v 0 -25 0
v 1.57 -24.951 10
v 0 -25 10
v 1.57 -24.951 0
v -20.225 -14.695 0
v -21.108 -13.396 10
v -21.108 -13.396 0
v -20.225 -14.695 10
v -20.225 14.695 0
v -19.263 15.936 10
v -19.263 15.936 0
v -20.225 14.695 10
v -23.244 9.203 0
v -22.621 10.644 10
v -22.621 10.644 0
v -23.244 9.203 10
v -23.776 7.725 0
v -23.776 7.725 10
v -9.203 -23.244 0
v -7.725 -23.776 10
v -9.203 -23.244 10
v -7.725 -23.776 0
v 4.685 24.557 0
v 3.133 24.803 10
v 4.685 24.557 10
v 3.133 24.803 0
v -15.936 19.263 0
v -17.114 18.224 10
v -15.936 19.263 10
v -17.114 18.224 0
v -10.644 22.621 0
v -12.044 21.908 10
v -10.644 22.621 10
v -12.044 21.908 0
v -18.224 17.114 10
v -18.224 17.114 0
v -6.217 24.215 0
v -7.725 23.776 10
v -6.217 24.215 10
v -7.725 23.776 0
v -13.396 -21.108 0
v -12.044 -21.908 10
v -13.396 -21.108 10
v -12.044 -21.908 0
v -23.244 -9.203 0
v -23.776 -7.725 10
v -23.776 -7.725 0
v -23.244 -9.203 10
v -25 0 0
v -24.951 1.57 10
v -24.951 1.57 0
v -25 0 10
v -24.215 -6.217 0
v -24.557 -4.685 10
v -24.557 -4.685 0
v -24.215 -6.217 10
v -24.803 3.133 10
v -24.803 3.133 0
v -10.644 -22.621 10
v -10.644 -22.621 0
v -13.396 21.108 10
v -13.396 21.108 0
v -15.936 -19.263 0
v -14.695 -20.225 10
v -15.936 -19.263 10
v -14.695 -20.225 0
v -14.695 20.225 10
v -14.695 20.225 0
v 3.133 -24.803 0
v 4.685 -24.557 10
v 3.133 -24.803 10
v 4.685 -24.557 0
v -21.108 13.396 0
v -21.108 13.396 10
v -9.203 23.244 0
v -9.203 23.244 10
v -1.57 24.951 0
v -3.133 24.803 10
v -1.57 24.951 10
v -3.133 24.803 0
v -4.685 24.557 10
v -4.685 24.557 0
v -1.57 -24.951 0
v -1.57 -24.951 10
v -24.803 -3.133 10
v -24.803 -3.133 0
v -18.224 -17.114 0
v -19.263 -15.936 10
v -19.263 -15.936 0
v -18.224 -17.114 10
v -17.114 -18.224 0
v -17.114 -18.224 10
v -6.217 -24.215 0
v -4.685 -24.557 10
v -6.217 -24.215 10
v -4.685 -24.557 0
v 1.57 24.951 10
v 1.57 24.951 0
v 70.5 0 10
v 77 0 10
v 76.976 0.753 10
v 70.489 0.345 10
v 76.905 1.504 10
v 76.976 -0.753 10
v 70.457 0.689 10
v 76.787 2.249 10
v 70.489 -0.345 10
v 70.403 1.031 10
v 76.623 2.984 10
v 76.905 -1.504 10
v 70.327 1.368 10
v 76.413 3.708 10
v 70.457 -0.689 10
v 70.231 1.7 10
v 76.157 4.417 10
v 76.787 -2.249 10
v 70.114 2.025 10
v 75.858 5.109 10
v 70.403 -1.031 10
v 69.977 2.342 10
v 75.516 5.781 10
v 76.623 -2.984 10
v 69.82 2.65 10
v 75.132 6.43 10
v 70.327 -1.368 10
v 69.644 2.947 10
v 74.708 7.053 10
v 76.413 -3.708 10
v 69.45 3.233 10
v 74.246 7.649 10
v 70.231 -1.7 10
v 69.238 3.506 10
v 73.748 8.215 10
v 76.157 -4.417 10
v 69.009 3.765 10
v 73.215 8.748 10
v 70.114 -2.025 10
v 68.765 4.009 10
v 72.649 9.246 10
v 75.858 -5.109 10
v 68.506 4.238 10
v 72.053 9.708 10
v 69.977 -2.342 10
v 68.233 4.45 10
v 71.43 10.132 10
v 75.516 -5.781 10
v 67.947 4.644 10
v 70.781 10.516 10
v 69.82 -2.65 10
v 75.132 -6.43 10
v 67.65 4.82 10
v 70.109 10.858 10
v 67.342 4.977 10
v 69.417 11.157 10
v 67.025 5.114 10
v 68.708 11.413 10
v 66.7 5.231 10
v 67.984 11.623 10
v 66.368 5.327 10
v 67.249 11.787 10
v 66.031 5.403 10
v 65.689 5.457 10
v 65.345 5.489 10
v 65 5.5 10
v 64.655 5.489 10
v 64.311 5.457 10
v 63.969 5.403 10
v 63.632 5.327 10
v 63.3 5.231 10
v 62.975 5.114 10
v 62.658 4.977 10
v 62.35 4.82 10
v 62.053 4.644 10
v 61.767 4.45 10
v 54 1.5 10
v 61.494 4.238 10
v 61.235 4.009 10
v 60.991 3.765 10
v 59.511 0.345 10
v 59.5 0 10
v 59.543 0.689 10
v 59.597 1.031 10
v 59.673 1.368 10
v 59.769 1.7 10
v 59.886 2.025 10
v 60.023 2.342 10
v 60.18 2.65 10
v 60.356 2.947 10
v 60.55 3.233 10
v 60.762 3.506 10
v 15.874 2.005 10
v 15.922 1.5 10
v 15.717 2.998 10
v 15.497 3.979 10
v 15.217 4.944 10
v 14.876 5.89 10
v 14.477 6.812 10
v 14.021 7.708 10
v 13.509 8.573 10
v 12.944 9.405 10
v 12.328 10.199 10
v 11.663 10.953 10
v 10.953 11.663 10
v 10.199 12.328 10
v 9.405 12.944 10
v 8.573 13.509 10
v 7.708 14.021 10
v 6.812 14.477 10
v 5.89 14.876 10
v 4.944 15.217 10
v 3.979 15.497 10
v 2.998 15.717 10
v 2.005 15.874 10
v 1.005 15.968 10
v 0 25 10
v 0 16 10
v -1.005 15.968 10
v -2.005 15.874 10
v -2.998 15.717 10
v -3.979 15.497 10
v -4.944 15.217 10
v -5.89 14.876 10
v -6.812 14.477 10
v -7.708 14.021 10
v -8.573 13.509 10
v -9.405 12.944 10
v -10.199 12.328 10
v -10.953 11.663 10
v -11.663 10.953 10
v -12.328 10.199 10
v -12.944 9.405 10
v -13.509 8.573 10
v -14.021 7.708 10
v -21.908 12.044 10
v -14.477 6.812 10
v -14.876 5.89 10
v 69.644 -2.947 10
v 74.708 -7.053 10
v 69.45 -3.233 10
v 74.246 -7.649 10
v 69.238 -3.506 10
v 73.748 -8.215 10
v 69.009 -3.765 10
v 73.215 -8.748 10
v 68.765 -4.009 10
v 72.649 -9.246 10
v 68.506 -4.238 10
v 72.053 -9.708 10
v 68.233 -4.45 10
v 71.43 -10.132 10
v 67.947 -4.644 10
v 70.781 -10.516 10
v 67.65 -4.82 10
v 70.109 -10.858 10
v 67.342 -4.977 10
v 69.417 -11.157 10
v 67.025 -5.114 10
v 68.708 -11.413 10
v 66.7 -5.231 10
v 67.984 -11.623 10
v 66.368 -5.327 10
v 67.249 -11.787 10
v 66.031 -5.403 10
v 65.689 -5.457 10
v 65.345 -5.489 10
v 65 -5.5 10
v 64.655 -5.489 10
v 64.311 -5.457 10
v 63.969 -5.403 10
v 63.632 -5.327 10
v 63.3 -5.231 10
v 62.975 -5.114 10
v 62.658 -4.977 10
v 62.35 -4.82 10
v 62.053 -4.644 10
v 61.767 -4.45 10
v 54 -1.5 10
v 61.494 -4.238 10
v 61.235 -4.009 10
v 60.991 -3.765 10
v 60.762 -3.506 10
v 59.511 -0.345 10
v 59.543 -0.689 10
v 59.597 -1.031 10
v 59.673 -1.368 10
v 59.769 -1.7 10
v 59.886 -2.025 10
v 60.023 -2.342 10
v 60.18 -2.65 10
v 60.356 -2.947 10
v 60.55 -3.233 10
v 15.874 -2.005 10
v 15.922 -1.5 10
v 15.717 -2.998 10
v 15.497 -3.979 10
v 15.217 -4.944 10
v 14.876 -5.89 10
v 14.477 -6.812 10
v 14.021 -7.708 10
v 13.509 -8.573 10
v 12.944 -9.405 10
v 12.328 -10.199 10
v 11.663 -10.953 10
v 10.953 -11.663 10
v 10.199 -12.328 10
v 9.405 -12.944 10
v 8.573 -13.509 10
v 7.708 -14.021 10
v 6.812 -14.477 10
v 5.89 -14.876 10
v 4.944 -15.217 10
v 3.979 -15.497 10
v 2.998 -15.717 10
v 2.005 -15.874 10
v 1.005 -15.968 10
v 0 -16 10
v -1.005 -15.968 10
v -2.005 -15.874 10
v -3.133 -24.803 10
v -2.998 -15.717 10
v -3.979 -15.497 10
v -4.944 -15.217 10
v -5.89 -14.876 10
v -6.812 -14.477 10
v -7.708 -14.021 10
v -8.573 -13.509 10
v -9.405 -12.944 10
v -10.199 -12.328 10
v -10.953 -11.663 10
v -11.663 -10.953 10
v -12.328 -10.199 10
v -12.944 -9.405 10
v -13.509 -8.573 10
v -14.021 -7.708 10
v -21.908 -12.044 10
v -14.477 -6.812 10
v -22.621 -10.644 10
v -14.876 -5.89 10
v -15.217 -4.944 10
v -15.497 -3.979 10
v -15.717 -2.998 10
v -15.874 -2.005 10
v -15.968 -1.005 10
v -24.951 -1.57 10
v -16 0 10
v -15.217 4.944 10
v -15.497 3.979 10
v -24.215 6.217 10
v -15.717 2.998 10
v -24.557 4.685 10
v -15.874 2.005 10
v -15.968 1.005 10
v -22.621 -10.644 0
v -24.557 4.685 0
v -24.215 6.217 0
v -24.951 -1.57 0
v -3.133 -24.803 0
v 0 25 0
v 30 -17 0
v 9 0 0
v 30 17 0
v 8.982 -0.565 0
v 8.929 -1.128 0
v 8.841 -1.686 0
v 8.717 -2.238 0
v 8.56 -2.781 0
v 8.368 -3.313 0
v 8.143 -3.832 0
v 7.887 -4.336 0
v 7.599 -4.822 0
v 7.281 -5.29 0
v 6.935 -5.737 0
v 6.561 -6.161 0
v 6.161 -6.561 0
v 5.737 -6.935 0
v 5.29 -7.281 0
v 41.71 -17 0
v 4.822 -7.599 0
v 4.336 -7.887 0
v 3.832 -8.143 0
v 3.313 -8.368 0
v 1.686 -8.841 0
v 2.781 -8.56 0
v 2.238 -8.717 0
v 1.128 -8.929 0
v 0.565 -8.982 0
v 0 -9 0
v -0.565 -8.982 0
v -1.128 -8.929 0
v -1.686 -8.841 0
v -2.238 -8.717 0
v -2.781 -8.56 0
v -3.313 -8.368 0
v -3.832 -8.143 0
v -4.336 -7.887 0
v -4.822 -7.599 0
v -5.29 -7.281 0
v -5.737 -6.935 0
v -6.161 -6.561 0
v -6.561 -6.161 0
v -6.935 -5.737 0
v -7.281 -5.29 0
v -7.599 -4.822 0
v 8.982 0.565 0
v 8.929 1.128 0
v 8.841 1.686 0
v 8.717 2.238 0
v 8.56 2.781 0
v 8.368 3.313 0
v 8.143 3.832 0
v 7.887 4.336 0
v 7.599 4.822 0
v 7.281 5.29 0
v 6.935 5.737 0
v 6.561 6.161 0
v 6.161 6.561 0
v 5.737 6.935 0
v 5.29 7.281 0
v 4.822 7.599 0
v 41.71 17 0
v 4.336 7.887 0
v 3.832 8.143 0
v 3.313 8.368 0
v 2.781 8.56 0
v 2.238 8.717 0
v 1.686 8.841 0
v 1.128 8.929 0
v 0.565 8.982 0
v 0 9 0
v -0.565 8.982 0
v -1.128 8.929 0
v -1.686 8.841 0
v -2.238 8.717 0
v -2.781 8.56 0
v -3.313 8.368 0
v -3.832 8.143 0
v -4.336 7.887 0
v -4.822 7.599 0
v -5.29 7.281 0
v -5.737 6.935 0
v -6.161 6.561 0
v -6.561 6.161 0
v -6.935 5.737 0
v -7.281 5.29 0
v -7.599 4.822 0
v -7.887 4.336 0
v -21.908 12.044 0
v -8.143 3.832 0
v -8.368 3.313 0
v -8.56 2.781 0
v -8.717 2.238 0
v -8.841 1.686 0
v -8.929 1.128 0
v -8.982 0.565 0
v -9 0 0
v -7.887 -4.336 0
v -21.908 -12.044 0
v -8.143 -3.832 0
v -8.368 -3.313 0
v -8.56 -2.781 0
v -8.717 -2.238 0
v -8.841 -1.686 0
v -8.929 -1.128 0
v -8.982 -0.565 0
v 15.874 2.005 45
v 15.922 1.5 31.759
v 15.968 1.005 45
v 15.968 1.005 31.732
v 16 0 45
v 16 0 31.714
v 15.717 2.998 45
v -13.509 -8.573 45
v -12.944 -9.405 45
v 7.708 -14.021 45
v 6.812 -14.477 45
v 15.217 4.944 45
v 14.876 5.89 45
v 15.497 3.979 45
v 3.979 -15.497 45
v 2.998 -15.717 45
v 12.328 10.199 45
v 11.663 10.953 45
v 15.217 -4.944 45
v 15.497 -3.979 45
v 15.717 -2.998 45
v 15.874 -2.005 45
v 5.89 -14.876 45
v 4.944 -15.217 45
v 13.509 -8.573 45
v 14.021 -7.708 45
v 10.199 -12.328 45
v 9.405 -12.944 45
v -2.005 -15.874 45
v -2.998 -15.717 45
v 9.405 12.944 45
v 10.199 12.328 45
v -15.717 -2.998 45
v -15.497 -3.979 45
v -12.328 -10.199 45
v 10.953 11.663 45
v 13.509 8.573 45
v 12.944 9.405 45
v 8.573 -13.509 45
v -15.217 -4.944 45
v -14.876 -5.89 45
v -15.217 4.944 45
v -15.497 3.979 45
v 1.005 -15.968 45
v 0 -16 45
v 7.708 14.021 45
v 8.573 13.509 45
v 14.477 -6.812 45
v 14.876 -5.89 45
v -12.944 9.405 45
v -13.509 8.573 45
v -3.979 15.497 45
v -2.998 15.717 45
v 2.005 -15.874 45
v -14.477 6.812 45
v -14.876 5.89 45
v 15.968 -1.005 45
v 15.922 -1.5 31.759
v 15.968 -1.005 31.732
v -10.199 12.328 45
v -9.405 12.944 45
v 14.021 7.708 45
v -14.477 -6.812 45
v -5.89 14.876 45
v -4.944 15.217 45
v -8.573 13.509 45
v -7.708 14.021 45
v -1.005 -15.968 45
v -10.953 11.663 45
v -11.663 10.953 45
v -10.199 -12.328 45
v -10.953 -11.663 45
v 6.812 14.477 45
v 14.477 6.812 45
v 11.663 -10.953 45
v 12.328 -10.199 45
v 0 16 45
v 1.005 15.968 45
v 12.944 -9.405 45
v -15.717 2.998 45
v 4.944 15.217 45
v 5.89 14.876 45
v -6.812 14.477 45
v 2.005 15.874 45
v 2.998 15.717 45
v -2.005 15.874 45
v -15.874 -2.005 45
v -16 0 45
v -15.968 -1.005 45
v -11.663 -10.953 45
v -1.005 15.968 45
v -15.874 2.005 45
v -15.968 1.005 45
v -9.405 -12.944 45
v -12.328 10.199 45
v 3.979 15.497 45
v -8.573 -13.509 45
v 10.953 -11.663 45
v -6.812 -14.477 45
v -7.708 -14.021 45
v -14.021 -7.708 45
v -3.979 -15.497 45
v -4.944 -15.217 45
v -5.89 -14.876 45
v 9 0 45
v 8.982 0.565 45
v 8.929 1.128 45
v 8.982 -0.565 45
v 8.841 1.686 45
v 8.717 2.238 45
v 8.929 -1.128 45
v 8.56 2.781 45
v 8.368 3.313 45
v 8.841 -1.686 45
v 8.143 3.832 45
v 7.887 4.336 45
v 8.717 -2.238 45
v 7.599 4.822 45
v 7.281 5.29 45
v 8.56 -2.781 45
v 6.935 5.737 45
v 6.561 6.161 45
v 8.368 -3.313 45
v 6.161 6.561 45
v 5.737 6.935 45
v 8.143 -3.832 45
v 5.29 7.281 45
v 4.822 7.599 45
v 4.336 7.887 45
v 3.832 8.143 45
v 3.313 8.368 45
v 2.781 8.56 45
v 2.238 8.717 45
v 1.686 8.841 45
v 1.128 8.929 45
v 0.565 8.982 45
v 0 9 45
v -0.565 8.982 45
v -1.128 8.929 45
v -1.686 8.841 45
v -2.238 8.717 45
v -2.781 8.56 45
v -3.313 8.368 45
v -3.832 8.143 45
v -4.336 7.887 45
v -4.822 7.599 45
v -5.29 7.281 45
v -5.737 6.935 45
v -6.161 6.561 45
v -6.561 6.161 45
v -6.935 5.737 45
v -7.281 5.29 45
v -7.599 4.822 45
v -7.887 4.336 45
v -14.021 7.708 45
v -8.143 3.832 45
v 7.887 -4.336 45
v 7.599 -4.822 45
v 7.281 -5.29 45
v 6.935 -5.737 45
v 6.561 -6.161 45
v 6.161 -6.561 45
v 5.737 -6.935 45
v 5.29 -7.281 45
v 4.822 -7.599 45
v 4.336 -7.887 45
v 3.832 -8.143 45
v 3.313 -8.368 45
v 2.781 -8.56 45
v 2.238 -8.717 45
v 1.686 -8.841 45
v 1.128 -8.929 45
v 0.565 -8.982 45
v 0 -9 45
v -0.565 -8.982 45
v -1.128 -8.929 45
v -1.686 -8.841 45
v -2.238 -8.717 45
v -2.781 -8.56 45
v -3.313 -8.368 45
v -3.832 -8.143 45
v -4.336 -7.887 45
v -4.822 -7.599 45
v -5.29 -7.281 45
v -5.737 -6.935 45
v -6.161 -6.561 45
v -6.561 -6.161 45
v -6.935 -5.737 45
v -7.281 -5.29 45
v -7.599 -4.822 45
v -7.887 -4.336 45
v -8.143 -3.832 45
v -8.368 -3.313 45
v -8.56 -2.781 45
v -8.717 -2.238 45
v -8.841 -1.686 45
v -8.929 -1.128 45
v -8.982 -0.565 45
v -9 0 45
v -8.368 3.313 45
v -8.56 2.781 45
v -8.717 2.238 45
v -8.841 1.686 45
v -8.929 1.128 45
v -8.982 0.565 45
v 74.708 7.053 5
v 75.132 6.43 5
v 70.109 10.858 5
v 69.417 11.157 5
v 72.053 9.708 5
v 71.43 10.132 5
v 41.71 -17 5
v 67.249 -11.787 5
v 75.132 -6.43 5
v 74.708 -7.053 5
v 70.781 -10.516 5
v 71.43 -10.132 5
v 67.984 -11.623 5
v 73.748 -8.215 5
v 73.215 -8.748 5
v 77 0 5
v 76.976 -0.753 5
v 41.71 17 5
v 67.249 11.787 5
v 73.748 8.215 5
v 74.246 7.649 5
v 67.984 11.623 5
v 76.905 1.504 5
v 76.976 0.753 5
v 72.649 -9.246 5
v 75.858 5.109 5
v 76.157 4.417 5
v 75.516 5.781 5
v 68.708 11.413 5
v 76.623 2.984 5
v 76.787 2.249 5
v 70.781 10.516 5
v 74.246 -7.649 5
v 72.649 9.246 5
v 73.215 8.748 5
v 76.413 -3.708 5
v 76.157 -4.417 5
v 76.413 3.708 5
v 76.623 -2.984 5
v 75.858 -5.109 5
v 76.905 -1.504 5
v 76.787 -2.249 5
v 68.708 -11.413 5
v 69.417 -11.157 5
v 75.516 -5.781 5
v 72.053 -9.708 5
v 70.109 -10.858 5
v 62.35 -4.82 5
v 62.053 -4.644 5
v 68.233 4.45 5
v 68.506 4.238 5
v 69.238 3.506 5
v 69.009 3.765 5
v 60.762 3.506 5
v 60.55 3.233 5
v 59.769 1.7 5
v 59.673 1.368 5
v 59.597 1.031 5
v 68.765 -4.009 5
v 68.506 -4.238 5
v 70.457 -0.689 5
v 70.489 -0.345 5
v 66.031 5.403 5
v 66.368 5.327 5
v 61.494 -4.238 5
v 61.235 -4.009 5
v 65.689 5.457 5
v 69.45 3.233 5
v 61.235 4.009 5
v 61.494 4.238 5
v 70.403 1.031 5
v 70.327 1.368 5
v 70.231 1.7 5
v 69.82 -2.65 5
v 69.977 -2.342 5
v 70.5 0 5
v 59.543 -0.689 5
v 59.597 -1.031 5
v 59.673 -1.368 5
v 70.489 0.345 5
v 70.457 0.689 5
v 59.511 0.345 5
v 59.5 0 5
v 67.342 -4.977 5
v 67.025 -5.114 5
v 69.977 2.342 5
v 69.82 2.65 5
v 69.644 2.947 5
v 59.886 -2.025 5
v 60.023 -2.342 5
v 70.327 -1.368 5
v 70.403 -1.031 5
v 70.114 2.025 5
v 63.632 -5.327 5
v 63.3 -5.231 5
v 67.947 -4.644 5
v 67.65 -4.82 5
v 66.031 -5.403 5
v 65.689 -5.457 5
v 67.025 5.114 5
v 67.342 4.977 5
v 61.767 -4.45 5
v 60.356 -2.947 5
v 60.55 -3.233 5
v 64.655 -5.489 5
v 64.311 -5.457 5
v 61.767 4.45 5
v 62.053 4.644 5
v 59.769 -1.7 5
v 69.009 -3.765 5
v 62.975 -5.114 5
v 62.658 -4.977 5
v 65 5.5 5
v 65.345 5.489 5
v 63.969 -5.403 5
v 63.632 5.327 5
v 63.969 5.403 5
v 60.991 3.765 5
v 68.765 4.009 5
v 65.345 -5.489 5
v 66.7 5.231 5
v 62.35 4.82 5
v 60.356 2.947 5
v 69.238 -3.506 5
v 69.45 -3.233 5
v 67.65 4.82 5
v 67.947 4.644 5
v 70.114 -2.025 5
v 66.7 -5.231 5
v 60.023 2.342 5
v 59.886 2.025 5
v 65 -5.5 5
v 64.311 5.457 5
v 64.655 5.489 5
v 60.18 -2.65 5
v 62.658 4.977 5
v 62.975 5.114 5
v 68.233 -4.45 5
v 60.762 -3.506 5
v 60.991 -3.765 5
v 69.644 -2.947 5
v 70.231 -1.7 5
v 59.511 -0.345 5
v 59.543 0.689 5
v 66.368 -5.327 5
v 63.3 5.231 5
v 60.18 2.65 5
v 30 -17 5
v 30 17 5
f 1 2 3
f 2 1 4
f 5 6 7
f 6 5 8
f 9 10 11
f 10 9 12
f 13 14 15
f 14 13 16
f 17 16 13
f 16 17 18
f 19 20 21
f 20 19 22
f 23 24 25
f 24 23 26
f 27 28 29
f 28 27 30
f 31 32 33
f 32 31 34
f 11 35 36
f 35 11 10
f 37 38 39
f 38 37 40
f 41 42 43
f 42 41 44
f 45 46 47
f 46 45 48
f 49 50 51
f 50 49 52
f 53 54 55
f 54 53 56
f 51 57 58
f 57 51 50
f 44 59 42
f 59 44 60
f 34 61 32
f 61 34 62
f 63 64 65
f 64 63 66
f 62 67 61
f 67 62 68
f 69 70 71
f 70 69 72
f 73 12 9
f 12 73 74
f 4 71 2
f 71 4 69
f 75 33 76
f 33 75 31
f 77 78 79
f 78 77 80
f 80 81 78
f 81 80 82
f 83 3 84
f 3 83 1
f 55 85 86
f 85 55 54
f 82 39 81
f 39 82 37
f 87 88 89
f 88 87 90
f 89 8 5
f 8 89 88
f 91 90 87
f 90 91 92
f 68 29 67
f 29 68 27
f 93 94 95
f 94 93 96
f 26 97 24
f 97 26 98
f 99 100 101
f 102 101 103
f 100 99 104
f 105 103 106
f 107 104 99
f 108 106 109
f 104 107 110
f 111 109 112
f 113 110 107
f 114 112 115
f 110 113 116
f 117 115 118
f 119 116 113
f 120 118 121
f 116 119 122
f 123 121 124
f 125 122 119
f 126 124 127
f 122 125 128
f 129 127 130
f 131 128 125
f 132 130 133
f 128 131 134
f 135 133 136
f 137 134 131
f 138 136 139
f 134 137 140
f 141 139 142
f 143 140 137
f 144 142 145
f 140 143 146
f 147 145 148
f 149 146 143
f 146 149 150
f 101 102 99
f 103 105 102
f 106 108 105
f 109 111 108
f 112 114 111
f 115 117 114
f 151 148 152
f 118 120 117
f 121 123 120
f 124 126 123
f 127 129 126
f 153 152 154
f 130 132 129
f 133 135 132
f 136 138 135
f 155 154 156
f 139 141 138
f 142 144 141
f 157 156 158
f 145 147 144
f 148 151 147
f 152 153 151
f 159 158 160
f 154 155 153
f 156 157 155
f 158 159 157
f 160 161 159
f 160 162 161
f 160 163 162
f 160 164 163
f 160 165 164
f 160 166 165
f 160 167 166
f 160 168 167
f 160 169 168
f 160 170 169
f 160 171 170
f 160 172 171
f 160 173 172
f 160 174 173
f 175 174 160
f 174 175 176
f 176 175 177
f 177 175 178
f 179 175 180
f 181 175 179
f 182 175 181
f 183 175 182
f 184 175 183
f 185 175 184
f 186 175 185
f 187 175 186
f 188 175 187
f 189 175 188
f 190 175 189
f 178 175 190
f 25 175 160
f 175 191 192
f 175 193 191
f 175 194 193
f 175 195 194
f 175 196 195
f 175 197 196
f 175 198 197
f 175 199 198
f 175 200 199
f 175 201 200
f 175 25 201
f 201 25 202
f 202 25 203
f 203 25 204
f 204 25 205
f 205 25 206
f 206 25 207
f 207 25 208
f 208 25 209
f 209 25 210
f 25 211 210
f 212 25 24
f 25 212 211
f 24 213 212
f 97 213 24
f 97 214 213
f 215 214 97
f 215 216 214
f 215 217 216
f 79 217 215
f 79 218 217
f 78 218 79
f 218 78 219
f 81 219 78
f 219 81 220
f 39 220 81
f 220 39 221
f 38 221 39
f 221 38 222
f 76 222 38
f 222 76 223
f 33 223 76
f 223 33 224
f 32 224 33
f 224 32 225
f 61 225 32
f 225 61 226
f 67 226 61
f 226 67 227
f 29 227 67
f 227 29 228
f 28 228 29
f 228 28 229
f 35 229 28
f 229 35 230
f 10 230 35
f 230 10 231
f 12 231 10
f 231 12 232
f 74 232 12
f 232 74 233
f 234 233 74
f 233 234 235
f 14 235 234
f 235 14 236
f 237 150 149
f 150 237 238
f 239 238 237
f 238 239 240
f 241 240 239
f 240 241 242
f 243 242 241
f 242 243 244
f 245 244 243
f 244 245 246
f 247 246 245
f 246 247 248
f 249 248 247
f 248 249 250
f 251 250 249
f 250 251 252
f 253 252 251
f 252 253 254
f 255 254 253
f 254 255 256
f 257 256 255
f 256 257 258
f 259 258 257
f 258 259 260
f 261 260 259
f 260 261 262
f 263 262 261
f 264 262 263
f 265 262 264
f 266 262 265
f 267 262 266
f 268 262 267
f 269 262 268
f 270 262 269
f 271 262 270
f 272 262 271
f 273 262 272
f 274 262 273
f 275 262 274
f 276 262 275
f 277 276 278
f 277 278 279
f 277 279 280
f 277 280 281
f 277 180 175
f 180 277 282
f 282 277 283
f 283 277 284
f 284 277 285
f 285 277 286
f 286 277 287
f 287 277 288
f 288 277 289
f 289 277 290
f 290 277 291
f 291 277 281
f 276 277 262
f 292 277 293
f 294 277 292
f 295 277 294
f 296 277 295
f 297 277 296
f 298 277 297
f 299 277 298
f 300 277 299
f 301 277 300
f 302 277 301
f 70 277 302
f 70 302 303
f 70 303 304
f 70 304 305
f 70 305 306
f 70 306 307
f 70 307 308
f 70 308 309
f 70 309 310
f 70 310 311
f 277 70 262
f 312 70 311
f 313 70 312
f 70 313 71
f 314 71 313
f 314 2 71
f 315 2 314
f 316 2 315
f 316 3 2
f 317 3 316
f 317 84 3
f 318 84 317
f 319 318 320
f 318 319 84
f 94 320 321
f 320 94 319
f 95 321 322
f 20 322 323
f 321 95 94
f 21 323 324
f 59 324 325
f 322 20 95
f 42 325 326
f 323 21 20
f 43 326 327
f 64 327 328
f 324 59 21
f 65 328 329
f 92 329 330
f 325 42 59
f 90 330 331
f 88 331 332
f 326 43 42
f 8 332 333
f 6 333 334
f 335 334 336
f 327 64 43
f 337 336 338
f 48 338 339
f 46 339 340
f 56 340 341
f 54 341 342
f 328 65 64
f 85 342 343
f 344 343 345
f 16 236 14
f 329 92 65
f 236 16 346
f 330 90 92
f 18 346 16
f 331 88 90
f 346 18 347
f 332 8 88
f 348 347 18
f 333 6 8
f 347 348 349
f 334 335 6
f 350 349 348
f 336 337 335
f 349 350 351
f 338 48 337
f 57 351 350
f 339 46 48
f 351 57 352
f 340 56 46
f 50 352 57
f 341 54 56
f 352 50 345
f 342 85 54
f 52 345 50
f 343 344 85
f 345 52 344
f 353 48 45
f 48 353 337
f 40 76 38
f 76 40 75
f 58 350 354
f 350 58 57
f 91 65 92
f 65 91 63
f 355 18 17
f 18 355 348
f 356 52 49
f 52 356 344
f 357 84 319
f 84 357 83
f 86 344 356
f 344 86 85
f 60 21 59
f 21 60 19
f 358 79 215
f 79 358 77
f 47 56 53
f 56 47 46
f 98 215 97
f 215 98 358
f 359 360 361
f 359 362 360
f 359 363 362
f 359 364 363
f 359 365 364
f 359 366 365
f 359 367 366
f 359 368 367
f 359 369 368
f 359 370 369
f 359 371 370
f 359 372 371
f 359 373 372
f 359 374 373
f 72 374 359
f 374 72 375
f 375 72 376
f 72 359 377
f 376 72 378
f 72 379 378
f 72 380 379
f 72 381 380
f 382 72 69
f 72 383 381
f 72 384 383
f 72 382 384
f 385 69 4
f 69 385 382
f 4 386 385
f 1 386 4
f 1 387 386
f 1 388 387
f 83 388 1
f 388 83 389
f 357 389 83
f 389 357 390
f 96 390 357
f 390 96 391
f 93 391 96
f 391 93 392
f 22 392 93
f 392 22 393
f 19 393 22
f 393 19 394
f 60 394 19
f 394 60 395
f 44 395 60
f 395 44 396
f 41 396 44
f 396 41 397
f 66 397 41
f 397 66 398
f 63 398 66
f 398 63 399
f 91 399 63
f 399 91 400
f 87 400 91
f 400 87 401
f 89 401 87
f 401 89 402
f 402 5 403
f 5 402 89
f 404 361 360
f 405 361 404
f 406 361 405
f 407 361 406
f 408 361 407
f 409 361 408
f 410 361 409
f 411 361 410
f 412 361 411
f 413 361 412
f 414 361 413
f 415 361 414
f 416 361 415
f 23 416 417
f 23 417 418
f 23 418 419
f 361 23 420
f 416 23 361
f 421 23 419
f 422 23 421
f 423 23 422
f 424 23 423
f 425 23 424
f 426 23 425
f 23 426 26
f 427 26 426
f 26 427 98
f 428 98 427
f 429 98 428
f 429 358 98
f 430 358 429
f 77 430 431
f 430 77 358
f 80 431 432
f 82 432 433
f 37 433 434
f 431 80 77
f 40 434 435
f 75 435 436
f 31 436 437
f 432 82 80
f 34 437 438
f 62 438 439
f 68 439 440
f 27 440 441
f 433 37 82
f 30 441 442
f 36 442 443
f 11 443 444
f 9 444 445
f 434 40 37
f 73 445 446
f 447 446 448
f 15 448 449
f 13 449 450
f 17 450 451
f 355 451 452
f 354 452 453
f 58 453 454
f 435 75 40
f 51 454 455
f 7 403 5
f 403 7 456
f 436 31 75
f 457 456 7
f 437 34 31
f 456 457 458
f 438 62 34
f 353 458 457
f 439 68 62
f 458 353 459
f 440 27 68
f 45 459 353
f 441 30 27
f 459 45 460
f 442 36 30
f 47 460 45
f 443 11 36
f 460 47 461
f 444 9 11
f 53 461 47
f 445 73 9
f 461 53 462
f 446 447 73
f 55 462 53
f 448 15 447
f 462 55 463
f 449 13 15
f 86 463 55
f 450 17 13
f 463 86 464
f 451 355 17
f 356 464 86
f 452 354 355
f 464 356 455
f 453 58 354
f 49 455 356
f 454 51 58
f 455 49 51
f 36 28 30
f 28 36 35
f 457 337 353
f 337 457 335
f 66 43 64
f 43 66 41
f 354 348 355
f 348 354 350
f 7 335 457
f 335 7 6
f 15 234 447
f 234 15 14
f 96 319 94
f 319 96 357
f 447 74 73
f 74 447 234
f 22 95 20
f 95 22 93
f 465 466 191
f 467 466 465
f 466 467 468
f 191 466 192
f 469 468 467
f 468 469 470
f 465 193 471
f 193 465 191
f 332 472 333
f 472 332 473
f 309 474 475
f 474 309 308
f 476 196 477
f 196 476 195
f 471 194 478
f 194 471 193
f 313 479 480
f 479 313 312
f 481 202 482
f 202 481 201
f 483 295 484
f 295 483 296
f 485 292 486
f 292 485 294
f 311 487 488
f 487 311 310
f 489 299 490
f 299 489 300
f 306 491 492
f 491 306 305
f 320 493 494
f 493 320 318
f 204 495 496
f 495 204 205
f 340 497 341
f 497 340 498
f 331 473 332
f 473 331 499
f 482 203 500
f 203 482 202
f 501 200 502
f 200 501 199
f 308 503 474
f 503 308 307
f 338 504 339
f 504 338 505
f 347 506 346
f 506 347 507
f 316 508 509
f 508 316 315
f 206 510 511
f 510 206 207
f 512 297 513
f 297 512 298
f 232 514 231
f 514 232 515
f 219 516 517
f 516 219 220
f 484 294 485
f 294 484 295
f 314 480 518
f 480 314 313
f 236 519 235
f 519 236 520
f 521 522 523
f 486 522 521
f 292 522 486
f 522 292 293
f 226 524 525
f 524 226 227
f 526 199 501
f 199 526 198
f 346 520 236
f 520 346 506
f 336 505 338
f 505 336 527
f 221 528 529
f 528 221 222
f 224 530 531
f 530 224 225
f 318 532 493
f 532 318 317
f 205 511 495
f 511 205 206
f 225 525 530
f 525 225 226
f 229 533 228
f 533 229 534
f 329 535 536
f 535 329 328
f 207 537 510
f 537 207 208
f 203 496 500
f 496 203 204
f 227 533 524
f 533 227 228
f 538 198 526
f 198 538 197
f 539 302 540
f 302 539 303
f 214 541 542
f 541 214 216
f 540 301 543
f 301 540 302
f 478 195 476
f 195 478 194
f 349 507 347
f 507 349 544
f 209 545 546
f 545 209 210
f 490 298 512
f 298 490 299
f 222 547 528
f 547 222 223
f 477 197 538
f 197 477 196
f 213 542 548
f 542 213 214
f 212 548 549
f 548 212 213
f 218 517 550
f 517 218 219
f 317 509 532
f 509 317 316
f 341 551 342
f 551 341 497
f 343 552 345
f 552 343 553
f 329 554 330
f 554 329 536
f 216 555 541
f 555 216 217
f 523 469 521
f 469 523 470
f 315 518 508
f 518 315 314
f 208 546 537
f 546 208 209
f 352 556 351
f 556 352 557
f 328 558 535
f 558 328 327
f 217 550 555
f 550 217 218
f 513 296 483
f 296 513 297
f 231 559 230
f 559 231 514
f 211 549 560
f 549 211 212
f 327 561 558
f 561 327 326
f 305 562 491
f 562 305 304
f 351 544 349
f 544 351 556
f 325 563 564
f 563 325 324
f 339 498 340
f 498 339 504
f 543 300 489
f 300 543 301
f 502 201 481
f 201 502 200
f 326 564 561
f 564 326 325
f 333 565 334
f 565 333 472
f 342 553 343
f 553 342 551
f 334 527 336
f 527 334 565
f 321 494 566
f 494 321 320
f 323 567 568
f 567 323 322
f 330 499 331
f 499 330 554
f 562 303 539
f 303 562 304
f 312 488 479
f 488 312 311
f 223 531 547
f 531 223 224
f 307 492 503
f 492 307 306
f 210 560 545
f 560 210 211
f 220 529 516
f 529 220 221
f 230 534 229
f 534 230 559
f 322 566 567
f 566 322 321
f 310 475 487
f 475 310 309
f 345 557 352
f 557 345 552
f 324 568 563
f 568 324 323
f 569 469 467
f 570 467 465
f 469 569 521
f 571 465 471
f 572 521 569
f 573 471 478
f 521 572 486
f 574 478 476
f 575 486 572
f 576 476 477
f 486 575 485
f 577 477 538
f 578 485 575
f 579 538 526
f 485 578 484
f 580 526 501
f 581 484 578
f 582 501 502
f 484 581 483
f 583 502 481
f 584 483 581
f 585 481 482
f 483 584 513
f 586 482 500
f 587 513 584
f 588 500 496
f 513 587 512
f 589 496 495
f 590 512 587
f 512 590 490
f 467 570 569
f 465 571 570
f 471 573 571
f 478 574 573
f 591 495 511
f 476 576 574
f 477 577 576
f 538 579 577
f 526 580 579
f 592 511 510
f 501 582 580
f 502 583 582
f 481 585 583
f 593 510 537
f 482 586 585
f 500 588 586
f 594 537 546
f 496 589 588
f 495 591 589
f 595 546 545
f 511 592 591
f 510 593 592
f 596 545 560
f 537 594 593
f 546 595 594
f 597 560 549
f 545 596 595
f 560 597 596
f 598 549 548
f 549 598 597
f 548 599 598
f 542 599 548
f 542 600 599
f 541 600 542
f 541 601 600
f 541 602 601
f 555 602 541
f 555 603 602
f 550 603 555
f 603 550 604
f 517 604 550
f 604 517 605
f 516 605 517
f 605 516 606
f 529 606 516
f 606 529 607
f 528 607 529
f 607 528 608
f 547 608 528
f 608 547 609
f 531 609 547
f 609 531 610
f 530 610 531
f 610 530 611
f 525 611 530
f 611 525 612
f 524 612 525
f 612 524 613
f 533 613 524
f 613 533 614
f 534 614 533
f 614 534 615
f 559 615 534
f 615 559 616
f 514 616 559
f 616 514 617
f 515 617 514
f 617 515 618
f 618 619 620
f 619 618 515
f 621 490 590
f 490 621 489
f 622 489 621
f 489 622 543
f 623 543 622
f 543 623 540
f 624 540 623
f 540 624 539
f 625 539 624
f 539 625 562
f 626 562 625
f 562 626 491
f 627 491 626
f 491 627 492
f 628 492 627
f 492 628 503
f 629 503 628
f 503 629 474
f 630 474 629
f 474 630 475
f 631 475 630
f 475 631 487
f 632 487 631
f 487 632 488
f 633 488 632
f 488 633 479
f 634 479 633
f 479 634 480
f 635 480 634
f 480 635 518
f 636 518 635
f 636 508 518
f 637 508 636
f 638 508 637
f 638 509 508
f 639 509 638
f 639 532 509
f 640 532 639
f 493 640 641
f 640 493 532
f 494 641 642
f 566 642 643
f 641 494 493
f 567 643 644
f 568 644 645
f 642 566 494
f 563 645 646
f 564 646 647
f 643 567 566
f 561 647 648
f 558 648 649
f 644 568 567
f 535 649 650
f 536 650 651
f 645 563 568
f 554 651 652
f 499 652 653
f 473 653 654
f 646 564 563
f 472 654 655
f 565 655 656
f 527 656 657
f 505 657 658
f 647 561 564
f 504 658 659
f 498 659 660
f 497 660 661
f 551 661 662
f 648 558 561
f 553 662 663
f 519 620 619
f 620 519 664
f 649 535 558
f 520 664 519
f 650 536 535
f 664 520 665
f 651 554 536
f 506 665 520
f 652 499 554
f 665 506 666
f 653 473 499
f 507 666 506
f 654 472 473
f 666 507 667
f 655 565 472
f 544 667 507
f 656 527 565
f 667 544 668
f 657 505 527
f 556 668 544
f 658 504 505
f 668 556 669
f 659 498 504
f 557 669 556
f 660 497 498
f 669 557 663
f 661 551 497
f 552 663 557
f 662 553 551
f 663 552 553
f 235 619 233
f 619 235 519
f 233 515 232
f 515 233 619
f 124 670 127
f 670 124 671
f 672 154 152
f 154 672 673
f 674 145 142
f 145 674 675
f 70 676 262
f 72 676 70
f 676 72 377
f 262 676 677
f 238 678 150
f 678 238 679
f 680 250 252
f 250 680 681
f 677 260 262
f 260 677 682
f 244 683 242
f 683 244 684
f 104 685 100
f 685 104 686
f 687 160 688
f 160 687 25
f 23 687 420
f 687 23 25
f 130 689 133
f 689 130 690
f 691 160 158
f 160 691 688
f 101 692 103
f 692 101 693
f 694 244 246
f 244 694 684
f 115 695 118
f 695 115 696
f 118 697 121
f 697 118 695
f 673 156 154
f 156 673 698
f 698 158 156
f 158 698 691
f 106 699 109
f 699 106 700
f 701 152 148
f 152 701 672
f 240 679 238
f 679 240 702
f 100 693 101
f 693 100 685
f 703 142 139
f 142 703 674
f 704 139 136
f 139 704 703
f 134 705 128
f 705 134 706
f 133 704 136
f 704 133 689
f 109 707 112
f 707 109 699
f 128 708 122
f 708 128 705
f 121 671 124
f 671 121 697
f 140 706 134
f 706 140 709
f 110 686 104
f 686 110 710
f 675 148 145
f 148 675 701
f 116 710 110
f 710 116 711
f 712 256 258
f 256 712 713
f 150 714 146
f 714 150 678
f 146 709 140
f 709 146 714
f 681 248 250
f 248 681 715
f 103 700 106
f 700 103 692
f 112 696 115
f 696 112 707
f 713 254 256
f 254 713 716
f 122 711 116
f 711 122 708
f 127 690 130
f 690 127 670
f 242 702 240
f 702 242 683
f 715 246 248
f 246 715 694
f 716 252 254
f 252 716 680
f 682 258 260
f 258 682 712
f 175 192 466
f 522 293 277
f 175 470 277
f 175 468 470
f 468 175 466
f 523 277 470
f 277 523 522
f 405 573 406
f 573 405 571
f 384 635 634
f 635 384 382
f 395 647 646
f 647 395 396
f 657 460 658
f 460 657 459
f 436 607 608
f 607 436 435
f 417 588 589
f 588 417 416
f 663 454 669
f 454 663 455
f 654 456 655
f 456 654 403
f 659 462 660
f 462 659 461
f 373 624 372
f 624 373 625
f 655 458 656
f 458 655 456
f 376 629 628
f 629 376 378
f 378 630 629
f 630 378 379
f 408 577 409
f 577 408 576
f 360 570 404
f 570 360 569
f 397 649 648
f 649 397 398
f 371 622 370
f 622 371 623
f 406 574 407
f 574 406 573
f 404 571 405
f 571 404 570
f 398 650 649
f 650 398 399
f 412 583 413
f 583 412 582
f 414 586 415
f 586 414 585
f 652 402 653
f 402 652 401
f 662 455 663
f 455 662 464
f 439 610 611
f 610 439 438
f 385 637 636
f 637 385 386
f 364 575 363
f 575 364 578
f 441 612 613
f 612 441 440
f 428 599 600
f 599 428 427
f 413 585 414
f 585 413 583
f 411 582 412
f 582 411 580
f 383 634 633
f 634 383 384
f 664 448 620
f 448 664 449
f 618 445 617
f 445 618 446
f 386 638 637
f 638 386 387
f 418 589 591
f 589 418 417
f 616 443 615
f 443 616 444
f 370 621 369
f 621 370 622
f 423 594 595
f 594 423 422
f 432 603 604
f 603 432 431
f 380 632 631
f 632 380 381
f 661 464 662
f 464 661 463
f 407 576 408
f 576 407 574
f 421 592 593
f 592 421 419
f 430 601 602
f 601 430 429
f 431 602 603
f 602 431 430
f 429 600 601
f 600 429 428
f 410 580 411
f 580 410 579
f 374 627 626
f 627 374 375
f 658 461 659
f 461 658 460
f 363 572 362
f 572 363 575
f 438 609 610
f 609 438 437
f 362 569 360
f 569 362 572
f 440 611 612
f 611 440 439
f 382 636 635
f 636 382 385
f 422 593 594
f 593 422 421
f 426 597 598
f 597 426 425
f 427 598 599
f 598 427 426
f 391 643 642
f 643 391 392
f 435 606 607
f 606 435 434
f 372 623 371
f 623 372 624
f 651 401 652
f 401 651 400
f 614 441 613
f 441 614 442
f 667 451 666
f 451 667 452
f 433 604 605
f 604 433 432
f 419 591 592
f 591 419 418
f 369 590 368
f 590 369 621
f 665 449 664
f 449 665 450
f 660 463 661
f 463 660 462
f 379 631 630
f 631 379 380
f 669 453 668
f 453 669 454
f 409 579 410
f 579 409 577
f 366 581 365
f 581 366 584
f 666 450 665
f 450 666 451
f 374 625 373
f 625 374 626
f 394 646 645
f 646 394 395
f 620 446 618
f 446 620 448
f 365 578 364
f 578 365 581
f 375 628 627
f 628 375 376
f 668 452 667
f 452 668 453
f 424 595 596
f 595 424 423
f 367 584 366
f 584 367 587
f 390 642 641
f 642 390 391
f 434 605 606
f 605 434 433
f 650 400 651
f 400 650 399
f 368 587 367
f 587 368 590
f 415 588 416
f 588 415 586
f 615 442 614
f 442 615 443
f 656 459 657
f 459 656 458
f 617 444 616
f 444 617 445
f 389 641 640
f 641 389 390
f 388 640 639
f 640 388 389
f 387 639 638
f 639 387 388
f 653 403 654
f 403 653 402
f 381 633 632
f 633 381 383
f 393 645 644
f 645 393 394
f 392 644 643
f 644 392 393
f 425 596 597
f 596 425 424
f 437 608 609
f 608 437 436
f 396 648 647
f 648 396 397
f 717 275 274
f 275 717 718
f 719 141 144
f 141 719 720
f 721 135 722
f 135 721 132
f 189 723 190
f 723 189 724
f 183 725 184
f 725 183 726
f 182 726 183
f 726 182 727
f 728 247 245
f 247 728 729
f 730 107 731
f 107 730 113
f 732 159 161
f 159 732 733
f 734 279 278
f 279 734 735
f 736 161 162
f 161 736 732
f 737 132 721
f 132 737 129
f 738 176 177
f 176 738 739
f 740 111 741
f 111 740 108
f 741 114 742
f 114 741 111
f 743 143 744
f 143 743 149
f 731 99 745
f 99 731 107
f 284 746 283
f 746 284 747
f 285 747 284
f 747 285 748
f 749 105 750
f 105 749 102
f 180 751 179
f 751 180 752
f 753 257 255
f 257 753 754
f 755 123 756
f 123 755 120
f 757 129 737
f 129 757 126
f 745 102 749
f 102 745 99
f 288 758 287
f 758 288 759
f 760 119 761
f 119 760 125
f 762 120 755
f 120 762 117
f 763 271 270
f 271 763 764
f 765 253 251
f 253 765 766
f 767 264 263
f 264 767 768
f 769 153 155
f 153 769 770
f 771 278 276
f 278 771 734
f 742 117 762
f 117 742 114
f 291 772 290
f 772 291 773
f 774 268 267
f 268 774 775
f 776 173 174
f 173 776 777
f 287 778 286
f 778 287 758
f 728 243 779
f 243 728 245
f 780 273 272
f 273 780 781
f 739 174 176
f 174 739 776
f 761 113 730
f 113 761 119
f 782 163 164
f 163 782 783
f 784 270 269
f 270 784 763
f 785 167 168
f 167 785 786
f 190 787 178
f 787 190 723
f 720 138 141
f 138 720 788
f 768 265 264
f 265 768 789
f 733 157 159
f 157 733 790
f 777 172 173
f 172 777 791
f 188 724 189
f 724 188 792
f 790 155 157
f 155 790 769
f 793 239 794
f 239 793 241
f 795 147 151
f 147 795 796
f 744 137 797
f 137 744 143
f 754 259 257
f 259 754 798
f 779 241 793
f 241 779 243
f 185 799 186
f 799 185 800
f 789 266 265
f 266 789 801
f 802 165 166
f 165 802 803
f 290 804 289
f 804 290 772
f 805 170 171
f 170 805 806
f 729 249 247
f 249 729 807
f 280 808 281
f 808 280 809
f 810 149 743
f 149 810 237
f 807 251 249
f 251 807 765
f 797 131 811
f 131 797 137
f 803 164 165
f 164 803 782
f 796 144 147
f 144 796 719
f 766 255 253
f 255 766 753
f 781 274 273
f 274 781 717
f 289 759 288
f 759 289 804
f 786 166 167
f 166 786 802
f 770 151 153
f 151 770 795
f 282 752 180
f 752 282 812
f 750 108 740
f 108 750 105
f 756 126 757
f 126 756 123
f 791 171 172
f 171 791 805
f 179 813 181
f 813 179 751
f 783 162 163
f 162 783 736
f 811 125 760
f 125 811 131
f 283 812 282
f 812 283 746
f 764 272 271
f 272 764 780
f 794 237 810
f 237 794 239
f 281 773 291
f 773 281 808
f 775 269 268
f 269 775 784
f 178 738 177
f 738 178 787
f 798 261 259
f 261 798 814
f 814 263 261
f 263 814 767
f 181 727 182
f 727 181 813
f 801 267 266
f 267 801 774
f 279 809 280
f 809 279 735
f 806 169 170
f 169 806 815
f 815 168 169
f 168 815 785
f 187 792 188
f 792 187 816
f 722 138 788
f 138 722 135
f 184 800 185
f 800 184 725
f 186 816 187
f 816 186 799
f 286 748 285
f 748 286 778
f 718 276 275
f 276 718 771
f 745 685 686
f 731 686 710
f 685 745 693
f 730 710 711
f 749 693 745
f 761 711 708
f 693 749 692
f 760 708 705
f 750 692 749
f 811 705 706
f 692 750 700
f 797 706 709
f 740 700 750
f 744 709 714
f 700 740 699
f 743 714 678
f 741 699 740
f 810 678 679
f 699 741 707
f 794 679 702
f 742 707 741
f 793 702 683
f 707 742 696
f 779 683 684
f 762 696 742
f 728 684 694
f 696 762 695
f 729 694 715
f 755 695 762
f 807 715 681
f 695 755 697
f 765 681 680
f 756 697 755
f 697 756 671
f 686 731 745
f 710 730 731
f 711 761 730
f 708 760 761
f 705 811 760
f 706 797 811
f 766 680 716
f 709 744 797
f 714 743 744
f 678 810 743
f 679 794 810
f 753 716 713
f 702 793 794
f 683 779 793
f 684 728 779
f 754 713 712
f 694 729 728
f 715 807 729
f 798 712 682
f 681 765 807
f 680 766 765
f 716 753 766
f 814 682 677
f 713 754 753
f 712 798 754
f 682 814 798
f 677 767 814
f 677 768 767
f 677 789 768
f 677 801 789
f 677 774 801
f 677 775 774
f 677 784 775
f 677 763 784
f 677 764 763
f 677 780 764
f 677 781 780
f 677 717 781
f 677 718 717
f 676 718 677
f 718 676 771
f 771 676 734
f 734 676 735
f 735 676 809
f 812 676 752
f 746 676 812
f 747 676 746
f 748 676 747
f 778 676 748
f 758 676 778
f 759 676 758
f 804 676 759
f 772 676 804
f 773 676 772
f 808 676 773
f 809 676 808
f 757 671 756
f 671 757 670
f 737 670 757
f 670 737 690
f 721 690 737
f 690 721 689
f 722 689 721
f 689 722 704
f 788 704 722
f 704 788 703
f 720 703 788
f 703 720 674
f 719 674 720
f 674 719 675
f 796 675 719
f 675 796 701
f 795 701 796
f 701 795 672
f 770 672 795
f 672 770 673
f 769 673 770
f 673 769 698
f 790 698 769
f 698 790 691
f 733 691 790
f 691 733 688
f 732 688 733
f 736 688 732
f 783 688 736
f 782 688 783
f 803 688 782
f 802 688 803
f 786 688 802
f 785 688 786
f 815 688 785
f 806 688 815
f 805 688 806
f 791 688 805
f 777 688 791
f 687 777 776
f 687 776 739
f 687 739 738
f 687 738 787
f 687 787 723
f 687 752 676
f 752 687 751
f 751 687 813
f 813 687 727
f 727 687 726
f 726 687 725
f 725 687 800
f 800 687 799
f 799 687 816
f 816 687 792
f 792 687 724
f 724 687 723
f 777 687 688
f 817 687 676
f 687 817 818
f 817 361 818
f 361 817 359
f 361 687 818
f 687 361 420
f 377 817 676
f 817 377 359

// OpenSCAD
// ==========================================
// Parametric Variables
// ==========================================
$fn = 100; // High resolution for smooth curved surfaces

// Base and Sleeve Dimensions
base_radius = 25;
base_height = 10;
sleeve_outer_radius = 16;
sleeve_inner_radius = 9;
sleeve_height = 45;

// Projecting Arm Dimensions
arm_length = 65; // Distance from center to end of the arm
arm_end_radius = 12;
arm_height = 10; // Flush with the base section
arm_hole_radius = 5.5;

// Underside Cutaway Dimensions
cutaway_length = 35; // Extent of the cutaway from the arm end towards the base
cutaway_height = 5;  // Height of the cutaway from the bottom (Z=0)

// Triangular Rib Dimensions
rib_thickness = 3;
rib_height = 22; // Height of the rib above the arm

// ==========================================
// Modules
// ==========================================

// Reusable module for the combined solid geometry
module solid_body() {
    union() {
        // 1. Low rounded base section
        cylinder(h=base_height, r=base_radius);

        // 2. Tall annular sleeve
        cylinder(h=sleeve_height, r=sleeve_outer_radius);

        // 3. Projecting side arm
        // Formed by a hull between the base and the smaller rounded end
        hull() {
            cylinder(h=arm_height, r=base_radius);
            translate([arm_length, 0, 0])
                cylinder(h=arm_height, r=arm_end_radius);
        }

        // 4. Thin triangular rib on top
        // Runs from the sleeve to the smaller rounded end as a raised web
        translate([0, 0, arm_height])
            rotate([90, 0, 0])
            linear_extrude(height=rib_thickness, center=true)
            polygon([
                // Overlap slightly into the sleeve to ensure manifold geometry
                [sleeve_outer_radius - 0.5, 0], 
                [sleeve_outer_radius - 0.5, rib_height], 
                // Overlap slightly into the arm end
                [arm_length - arm_end_radius + 1, 0] 
            ]);
    }
}

// ==========================================
// Main Model Assembly
// ==========================================

// Subtract holes and cutaways from the main solid body
difference() {
    solid_body();

    // A. Central bore continuing through the stepped circular portions
    // Extends slightly below Z=0 and above the sleeve for a clean cut
    translate([0, 0, -1])
        cylinder(h=sleeve_height + 2, r=sleeve_inner_radius);

    // B. Real rounded opening at the smaller rounded end
    translate([arm_length, 0, -1])
        cylinder(h=arm_height + 2, r=arm_hole_radius);

    // C. Stepped underside lower cutaway
    // Removes material from the bottom of the outer arm portion
    // so it sits on a higher tier
    translate([arm_length - cutaway_length, -arm_end_radius - 5, -1])
        cube([
            cutaway_length + arm_end_radius + 5, // Extends past the end
            (arm_end_radius + 5) * 2,            // Wider than the arm
            cutaway_height + 1                   // Height of the cutaway + offset
        ]);
}
